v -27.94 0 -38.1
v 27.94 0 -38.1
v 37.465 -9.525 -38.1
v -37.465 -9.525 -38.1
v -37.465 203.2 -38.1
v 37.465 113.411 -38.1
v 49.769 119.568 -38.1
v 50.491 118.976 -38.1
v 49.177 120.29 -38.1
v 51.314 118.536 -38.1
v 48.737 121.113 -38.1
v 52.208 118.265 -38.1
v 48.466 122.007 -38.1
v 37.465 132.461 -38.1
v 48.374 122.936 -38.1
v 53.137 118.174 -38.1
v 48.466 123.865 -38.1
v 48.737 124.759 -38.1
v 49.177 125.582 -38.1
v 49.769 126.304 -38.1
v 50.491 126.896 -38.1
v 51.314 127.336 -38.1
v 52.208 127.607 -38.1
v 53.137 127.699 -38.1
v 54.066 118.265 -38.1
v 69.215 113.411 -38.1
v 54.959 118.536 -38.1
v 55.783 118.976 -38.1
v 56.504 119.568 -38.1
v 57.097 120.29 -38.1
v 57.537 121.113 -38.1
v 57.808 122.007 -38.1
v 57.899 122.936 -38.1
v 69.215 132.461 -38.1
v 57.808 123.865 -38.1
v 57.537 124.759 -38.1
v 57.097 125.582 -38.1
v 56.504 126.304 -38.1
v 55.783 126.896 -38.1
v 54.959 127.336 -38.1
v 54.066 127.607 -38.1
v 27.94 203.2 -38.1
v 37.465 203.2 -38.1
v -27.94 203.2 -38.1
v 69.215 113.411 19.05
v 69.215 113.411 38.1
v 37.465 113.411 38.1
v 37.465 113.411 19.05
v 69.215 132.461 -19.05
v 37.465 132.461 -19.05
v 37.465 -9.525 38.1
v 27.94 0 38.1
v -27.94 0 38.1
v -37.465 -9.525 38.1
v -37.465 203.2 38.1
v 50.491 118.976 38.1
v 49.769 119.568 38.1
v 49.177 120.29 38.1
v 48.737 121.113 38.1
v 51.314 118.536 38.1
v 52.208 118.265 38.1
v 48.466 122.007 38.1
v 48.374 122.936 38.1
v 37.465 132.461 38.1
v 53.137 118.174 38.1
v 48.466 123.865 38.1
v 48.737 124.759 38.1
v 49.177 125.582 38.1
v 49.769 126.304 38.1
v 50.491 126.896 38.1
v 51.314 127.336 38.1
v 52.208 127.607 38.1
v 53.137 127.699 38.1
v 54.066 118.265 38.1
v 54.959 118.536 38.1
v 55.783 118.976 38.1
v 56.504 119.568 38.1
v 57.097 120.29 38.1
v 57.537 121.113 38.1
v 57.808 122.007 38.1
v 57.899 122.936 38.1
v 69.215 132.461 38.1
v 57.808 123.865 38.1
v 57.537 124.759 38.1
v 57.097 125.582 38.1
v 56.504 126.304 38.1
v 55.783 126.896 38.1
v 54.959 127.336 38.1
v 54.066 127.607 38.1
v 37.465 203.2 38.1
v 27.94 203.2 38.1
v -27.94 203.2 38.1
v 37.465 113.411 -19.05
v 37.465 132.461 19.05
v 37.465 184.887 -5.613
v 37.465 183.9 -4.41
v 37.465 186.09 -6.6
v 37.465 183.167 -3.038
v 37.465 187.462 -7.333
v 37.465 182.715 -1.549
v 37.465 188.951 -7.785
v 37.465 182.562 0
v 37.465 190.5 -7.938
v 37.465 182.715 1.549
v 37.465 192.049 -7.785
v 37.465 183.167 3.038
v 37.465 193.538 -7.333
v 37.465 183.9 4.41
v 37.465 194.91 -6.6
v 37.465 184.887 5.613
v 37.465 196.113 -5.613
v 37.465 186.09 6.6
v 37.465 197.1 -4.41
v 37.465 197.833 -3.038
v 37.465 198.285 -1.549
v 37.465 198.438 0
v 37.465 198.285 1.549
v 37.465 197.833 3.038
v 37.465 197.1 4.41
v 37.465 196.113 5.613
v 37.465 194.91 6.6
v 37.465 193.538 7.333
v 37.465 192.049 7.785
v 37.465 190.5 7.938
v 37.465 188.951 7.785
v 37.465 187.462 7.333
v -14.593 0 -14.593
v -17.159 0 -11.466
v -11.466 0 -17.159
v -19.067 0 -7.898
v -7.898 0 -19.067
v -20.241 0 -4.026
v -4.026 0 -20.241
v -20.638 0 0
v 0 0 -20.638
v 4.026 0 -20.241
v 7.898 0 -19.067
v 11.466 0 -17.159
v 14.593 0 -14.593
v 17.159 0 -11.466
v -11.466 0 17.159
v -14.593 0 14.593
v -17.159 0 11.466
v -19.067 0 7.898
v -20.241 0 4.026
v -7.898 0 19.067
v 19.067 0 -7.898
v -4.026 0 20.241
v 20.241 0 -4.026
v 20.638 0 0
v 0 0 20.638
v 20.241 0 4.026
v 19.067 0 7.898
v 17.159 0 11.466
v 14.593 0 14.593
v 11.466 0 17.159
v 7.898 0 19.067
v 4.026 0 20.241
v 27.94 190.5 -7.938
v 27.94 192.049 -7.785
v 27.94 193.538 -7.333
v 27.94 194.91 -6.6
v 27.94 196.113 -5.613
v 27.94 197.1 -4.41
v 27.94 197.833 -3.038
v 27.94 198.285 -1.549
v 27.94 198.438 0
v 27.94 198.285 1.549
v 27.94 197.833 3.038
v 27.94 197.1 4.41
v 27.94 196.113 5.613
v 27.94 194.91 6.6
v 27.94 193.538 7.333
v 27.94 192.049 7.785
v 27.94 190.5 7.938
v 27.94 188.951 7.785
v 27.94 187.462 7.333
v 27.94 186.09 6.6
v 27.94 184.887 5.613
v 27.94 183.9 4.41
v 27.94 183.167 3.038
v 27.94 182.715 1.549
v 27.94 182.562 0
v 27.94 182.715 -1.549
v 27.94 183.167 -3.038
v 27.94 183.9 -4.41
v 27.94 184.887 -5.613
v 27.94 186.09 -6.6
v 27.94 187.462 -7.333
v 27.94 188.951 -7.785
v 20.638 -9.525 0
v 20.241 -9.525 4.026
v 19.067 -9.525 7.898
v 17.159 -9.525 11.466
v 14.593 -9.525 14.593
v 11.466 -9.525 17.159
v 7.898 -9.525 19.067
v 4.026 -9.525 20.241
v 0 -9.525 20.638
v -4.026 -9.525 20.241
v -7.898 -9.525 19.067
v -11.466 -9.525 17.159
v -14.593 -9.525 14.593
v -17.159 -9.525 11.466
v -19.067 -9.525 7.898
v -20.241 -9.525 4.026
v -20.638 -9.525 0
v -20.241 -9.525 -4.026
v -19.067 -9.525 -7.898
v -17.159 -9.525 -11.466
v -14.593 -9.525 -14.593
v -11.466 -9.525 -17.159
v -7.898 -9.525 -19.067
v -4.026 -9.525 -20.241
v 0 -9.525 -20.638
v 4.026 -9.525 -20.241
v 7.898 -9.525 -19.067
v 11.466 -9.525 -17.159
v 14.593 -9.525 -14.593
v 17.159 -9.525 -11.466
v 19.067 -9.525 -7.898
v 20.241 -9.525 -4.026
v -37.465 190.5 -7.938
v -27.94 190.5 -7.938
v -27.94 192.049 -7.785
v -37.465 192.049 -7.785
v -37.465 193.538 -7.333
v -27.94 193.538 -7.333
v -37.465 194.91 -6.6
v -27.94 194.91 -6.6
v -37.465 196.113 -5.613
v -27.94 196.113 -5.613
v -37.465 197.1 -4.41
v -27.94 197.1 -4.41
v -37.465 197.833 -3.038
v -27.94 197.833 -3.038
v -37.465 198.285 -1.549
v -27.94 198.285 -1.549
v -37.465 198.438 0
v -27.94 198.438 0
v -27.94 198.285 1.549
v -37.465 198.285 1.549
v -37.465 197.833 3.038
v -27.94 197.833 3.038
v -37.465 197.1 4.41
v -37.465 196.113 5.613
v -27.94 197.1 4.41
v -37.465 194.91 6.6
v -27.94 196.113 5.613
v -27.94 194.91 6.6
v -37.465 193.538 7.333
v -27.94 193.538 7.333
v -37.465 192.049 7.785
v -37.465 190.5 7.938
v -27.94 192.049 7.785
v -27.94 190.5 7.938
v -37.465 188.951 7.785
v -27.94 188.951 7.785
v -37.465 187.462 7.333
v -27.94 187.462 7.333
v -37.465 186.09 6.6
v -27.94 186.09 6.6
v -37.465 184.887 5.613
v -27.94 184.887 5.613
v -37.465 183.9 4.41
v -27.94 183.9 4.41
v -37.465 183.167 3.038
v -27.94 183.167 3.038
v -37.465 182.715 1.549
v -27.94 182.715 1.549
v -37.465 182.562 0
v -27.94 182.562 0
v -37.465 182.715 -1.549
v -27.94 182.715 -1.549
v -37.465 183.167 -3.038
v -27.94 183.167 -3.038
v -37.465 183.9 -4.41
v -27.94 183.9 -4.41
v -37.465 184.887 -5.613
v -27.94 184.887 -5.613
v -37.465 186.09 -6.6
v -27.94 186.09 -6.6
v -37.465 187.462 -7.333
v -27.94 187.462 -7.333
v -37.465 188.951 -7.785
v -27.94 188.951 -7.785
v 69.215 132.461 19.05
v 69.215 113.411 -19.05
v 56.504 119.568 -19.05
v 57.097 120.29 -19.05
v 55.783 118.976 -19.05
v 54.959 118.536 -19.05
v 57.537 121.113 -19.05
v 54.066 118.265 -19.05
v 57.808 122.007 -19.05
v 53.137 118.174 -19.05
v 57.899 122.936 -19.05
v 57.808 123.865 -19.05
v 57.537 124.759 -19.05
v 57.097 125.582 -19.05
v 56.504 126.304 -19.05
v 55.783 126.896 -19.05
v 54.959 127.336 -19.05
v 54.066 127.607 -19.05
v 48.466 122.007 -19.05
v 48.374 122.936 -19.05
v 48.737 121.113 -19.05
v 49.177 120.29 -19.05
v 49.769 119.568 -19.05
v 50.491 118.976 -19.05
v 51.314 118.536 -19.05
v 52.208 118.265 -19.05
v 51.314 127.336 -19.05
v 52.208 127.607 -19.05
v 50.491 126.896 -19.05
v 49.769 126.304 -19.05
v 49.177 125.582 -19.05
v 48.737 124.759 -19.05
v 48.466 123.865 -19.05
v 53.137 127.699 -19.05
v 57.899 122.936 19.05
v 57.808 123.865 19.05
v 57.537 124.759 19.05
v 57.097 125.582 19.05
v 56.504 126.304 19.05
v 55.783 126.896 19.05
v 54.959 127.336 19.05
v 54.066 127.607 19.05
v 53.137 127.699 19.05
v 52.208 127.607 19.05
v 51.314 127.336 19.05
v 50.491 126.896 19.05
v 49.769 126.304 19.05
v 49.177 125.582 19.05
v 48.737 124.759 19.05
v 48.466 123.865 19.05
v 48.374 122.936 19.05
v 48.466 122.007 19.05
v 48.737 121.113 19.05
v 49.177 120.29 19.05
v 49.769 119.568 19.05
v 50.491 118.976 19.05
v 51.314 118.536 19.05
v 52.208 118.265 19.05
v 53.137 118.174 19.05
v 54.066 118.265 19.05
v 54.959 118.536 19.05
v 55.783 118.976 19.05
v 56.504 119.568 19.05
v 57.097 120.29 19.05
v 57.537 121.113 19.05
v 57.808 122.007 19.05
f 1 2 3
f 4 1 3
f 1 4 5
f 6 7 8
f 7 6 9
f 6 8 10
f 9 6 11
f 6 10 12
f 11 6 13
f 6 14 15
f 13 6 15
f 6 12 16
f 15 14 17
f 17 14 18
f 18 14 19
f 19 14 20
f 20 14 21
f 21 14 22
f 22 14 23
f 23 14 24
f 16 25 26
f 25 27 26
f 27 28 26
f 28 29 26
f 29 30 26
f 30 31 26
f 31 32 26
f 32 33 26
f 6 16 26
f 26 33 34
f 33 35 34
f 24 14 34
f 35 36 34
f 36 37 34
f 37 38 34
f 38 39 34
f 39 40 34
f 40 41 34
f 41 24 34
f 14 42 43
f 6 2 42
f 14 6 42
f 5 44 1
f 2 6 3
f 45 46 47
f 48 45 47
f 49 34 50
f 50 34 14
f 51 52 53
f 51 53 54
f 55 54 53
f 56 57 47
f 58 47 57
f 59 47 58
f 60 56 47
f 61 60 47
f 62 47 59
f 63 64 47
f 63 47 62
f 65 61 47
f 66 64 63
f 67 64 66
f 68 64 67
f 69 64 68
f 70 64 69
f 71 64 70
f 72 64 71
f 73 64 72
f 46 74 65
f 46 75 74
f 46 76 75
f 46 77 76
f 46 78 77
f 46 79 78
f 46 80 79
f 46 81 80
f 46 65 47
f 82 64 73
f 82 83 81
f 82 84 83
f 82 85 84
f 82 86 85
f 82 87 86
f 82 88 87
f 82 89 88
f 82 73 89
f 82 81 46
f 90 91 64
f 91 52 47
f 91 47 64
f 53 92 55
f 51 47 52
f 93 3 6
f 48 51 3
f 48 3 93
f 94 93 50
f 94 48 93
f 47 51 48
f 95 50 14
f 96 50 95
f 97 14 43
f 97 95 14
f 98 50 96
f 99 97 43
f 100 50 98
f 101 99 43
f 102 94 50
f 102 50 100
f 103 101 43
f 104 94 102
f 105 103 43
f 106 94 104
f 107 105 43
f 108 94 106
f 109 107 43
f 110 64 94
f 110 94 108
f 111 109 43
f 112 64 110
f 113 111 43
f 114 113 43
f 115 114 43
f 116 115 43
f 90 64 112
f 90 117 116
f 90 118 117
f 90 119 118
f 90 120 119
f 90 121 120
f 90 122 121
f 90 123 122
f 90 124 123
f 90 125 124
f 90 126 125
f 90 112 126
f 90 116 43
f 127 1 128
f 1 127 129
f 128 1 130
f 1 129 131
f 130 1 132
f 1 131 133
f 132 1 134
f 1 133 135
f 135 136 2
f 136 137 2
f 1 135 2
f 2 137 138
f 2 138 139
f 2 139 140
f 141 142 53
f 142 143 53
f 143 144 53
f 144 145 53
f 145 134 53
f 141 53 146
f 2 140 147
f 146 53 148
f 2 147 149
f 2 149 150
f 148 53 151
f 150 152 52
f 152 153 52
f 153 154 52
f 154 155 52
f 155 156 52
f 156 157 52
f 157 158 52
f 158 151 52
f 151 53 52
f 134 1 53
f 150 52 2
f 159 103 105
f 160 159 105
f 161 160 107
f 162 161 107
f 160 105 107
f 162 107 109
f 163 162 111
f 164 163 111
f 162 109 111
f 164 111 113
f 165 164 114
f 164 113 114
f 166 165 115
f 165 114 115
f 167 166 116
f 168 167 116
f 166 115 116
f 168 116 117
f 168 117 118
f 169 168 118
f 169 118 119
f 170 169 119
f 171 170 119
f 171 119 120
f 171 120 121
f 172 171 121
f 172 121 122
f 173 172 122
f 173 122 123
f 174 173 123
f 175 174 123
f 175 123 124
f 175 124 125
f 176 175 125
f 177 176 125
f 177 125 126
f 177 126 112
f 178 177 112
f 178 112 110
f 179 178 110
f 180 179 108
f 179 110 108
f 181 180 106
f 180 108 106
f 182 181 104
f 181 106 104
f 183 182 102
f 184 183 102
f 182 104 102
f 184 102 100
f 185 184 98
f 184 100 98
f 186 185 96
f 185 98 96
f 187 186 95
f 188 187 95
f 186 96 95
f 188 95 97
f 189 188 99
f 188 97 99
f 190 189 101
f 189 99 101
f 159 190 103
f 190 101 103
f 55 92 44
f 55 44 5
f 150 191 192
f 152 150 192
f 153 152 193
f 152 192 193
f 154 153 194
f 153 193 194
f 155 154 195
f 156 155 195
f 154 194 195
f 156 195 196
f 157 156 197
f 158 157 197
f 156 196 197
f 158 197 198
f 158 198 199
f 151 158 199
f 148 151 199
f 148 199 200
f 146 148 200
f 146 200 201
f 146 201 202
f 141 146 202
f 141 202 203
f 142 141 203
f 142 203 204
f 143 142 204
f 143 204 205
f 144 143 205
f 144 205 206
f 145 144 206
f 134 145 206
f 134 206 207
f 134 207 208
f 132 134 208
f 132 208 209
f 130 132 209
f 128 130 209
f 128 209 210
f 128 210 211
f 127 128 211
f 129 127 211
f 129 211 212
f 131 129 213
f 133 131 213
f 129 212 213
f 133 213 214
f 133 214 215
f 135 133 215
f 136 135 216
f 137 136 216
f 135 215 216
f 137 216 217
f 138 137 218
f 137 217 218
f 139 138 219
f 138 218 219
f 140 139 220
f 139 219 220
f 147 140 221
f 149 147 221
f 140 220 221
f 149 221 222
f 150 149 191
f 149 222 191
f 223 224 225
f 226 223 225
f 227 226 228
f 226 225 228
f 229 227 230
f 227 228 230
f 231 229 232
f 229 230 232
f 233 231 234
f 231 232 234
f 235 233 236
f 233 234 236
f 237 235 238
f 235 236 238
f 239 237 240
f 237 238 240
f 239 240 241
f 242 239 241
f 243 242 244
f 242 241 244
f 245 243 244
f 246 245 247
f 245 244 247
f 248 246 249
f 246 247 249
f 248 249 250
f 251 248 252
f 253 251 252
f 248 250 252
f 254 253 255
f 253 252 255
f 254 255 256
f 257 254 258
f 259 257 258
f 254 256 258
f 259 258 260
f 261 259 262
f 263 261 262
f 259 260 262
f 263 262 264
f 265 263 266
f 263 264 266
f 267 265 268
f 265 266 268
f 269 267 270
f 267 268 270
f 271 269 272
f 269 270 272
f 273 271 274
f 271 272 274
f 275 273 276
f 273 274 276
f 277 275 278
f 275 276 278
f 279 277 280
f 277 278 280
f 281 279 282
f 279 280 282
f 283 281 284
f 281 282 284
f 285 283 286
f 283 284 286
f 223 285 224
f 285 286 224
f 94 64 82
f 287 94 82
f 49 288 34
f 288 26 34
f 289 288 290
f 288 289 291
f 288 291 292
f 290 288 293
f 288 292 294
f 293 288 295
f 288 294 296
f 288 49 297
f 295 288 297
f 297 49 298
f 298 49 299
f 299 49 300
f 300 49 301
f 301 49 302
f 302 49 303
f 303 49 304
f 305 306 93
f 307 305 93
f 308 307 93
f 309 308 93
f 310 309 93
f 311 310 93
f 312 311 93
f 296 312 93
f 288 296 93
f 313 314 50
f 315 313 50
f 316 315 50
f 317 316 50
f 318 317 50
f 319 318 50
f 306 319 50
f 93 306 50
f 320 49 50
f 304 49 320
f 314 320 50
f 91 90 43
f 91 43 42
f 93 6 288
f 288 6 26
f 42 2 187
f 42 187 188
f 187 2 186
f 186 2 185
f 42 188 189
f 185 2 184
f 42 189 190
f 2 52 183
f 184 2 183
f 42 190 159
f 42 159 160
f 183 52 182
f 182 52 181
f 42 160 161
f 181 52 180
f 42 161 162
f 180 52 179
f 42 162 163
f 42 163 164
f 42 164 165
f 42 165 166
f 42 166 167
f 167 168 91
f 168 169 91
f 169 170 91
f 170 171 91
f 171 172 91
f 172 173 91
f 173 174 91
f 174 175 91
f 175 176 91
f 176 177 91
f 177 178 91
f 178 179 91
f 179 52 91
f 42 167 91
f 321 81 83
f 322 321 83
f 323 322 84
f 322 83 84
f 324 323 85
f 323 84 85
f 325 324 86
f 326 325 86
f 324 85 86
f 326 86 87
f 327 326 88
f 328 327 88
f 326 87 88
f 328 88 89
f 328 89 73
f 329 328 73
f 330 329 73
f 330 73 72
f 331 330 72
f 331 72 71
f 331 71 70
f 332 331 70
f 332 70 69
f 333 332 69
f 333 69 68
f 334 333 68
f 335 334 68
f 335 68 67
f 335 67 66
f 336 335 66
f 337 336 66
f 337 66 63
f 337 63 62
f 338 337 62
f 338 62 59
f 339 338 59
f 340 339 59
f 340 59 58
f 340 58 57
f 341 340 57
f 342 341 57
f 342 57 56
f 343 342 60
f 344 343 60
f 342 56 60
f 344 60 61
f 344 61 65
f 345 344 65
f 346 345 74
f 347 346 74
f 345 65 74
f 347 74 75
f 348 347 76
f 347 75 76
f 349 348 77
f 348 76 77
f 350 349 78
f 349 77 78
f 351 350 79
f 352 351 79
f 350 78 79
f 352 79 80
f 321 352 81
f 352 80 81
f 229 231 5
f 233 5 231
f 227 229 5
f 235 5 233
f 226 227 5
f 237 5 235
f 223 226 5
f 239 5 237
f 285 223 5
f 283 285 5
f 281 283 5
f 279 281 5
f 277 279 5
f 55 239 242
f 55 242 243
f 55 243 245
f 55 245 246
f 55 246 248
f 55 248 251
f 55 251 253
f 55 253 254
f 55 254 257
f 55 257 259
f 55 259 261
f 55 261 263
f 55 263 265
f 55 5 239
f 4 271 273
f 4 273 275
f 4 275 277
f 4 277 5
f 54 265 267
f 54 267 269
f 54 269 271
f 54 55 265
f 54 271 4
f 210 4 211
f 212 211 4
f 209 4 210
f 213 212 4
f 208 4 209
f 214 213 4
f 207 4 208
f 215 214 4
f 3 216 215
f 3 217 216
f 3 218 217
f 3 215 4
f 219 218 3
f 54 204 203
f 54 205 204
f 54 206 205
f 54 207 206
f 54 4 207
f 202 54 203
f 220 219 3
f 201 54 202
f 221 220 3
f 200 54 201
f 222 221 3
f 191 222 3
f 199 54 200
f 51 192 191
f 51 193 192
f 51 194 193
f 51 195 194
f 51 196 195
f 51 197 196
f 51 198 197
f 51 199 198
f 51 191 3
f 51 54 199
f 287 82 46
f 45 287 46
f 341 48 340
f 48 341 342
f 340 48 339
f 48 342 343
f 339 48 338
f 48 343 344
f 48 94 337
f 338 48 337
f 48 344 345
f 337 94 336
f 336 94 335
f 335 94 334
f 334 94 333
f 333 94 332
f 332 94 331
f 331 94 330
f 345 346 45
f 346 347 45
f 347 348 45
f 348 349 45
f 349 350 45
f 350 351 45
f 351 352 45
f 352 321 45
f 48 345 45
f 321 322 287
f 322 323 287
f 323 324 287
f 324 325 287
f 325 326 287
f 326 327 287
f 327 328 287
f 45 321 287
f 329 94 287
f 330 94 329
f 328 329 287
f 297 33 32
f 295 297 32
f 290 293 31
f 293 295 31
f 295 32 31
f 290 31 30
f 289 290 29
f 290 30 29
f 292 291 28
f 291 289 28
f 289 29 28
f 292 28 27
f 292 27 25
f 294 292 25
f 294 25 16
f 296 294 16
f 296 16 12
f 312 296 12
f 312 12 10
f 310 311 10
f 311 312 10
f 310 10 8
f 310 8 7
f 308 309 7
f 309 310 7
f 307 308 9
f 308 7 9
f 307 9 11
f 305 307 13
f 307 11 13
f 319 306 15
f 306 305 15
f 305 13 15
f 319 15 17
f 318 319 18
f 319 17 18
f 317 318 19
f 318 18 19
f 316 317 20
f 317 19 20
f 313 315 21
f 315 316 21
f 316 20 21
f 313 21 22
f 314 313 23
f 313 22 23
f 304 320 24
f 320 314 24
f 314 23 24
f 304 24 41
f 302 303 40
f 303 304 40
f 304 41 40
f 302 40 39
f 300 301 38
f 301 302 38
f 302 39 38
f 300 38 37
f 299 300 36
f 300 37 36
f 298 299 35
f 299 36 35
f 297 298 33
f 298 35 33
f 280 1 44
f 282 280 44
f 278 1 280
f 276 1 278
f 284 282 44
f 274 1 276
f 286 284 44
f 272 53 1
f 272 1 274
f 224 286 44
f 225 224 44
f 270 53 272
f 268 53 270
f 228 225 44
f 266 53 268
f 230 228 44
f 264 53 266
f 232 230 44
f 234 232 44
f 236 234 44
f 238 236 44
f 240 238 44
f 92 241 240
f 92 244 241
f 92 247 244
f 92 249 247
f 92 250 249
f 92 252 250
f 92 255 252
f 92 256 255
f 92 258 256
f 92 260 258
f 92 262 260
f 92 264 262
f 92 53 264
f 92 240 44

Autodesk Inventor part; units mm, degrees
ref_plane "YZ Plane" through (0, 0, 0) normal (1, 0, 0) x (0, 1, 0)
ref_plane "XZ Plane" through (0, 0, 0) normal (0, 1, 0) x (-1, 0, 0)
ref_plane "XY Plane" through (0, 0, 0) normal (0, 0, 1) x (1, 0, 0)
sketch "Sketch1" plane through (0, 0, 0) normal (0, 0, 1) x (1, 0, 0)
  line L0 (0, 0) -> (27.94, 0)
  line L1 (27.94, 0) -> (27.94, 203.2)
  line L2 (0, 0) -> (-27.94, 0)
  line L3 (-27.94, 0) -> (-27.94, 203.2)
  line L4 (-27.94, 203.2) -> (-37.465, 203.2)
  line L5 (-37.465, 203.2) -> (-37.465, -9.525)
  line L6 (-37.465, -9.525) -> (37.465, -9.525)
  line L7 (37.465, -9.525) -> (37.465, 203.2)
  line L8 (37.465, 203.2) -> (27.94, 203.2)
  dimension "d0" = 203.2
  dimension "d1" = 27.94
  dimension "x2" = 9.525
  dimension "d3" = 9.525
  dimension "d4" = 9.525
extrude "Extrusion1" add sketch "Sketch1" against normal mid plane 76.2
sketch "Sketch2" plane through (37.465, -9.525, -38.1) normal (1, 0, 0) x (0, 0, -1)
  circle A0 centre (-38.1, 200.025) radius 7.9375
  point P0 (-38.1, 9.525)
  dimension "d7" = 15.875
  dimension "d8" = 190.5
extrude "Extrusion2" cut sketch "Sketch2" against normal through all
sketch "Sketch3" plane through (0, 0, 38.1) normal (0, 0, 1) x (1, 0, 0)
  line L0 (37.465, 203.2) -> (37.465, -9.525) projected
  line L1 (37.465, 132.461) -> (69.215, 132.461)
  line L2 (69.215, 132.461) -> (69.215, 113.411)
  line L3 (69.215, 113.411) -> (37.465, 113.411)
  line L4 (37.465, 113.411) -> (37.465, 132.461)
  line L5 (37.465, 122.936) -> (69.215, 122.936) construction
  line L6 (-37.465, -9.525) -> (37.465, -9.525) construction
  circle A0 centre (53.1368, 122.936) radius 4.7625
  point P0 (0, 0)
  point P1 (37.465, 113.411)
  dimension "d20" = 31.75
  dimension "d21" = 19.05
  dimension "d22" = 132.461
  dimension "d23" = 9.525
  dimension "d24" = 15.6718
extrude "Extrusion3" add sketch "Sketch3" against normal blind 19.05
mirror "Mirror1" about plane through (0, 0, 0) normal (0, 0, 1) of "Extrusion3"
sketch "Sketch4" plane through (-37.465, -9.525, -38.1) normal (0, -1, 0) x (1, 0, 0)
  circle A0 centre (37.465, 38.1) radius 20.6375
  dimension "d27" = 41.275
extrude "Extrusion4" cut sketch "Sketch4" against normal through all
equation "\"d0\" = overallHeight"
equation "\"x2\" = wallThickness"
equation "\"d3\" = wallThickness"
equation "\"d4\" = wallThickness"
equation "\"d5\" = overallWidth"
equation "\"d7\" = postHoleDiameter"
equation "\"d8\" = postHoleFromTop"
equation "\"postHoleDiameter\" = 15.875"
equation "\"overallHeight\" = 203.2"
equation "\"wallThickness\" = 9.525"
equation "\"overallWidth\" = 76.2"
equation "\"postHoleFromTop\" = 190.5"
properties part number "forkV02" material "PC/ABS Plastic"
